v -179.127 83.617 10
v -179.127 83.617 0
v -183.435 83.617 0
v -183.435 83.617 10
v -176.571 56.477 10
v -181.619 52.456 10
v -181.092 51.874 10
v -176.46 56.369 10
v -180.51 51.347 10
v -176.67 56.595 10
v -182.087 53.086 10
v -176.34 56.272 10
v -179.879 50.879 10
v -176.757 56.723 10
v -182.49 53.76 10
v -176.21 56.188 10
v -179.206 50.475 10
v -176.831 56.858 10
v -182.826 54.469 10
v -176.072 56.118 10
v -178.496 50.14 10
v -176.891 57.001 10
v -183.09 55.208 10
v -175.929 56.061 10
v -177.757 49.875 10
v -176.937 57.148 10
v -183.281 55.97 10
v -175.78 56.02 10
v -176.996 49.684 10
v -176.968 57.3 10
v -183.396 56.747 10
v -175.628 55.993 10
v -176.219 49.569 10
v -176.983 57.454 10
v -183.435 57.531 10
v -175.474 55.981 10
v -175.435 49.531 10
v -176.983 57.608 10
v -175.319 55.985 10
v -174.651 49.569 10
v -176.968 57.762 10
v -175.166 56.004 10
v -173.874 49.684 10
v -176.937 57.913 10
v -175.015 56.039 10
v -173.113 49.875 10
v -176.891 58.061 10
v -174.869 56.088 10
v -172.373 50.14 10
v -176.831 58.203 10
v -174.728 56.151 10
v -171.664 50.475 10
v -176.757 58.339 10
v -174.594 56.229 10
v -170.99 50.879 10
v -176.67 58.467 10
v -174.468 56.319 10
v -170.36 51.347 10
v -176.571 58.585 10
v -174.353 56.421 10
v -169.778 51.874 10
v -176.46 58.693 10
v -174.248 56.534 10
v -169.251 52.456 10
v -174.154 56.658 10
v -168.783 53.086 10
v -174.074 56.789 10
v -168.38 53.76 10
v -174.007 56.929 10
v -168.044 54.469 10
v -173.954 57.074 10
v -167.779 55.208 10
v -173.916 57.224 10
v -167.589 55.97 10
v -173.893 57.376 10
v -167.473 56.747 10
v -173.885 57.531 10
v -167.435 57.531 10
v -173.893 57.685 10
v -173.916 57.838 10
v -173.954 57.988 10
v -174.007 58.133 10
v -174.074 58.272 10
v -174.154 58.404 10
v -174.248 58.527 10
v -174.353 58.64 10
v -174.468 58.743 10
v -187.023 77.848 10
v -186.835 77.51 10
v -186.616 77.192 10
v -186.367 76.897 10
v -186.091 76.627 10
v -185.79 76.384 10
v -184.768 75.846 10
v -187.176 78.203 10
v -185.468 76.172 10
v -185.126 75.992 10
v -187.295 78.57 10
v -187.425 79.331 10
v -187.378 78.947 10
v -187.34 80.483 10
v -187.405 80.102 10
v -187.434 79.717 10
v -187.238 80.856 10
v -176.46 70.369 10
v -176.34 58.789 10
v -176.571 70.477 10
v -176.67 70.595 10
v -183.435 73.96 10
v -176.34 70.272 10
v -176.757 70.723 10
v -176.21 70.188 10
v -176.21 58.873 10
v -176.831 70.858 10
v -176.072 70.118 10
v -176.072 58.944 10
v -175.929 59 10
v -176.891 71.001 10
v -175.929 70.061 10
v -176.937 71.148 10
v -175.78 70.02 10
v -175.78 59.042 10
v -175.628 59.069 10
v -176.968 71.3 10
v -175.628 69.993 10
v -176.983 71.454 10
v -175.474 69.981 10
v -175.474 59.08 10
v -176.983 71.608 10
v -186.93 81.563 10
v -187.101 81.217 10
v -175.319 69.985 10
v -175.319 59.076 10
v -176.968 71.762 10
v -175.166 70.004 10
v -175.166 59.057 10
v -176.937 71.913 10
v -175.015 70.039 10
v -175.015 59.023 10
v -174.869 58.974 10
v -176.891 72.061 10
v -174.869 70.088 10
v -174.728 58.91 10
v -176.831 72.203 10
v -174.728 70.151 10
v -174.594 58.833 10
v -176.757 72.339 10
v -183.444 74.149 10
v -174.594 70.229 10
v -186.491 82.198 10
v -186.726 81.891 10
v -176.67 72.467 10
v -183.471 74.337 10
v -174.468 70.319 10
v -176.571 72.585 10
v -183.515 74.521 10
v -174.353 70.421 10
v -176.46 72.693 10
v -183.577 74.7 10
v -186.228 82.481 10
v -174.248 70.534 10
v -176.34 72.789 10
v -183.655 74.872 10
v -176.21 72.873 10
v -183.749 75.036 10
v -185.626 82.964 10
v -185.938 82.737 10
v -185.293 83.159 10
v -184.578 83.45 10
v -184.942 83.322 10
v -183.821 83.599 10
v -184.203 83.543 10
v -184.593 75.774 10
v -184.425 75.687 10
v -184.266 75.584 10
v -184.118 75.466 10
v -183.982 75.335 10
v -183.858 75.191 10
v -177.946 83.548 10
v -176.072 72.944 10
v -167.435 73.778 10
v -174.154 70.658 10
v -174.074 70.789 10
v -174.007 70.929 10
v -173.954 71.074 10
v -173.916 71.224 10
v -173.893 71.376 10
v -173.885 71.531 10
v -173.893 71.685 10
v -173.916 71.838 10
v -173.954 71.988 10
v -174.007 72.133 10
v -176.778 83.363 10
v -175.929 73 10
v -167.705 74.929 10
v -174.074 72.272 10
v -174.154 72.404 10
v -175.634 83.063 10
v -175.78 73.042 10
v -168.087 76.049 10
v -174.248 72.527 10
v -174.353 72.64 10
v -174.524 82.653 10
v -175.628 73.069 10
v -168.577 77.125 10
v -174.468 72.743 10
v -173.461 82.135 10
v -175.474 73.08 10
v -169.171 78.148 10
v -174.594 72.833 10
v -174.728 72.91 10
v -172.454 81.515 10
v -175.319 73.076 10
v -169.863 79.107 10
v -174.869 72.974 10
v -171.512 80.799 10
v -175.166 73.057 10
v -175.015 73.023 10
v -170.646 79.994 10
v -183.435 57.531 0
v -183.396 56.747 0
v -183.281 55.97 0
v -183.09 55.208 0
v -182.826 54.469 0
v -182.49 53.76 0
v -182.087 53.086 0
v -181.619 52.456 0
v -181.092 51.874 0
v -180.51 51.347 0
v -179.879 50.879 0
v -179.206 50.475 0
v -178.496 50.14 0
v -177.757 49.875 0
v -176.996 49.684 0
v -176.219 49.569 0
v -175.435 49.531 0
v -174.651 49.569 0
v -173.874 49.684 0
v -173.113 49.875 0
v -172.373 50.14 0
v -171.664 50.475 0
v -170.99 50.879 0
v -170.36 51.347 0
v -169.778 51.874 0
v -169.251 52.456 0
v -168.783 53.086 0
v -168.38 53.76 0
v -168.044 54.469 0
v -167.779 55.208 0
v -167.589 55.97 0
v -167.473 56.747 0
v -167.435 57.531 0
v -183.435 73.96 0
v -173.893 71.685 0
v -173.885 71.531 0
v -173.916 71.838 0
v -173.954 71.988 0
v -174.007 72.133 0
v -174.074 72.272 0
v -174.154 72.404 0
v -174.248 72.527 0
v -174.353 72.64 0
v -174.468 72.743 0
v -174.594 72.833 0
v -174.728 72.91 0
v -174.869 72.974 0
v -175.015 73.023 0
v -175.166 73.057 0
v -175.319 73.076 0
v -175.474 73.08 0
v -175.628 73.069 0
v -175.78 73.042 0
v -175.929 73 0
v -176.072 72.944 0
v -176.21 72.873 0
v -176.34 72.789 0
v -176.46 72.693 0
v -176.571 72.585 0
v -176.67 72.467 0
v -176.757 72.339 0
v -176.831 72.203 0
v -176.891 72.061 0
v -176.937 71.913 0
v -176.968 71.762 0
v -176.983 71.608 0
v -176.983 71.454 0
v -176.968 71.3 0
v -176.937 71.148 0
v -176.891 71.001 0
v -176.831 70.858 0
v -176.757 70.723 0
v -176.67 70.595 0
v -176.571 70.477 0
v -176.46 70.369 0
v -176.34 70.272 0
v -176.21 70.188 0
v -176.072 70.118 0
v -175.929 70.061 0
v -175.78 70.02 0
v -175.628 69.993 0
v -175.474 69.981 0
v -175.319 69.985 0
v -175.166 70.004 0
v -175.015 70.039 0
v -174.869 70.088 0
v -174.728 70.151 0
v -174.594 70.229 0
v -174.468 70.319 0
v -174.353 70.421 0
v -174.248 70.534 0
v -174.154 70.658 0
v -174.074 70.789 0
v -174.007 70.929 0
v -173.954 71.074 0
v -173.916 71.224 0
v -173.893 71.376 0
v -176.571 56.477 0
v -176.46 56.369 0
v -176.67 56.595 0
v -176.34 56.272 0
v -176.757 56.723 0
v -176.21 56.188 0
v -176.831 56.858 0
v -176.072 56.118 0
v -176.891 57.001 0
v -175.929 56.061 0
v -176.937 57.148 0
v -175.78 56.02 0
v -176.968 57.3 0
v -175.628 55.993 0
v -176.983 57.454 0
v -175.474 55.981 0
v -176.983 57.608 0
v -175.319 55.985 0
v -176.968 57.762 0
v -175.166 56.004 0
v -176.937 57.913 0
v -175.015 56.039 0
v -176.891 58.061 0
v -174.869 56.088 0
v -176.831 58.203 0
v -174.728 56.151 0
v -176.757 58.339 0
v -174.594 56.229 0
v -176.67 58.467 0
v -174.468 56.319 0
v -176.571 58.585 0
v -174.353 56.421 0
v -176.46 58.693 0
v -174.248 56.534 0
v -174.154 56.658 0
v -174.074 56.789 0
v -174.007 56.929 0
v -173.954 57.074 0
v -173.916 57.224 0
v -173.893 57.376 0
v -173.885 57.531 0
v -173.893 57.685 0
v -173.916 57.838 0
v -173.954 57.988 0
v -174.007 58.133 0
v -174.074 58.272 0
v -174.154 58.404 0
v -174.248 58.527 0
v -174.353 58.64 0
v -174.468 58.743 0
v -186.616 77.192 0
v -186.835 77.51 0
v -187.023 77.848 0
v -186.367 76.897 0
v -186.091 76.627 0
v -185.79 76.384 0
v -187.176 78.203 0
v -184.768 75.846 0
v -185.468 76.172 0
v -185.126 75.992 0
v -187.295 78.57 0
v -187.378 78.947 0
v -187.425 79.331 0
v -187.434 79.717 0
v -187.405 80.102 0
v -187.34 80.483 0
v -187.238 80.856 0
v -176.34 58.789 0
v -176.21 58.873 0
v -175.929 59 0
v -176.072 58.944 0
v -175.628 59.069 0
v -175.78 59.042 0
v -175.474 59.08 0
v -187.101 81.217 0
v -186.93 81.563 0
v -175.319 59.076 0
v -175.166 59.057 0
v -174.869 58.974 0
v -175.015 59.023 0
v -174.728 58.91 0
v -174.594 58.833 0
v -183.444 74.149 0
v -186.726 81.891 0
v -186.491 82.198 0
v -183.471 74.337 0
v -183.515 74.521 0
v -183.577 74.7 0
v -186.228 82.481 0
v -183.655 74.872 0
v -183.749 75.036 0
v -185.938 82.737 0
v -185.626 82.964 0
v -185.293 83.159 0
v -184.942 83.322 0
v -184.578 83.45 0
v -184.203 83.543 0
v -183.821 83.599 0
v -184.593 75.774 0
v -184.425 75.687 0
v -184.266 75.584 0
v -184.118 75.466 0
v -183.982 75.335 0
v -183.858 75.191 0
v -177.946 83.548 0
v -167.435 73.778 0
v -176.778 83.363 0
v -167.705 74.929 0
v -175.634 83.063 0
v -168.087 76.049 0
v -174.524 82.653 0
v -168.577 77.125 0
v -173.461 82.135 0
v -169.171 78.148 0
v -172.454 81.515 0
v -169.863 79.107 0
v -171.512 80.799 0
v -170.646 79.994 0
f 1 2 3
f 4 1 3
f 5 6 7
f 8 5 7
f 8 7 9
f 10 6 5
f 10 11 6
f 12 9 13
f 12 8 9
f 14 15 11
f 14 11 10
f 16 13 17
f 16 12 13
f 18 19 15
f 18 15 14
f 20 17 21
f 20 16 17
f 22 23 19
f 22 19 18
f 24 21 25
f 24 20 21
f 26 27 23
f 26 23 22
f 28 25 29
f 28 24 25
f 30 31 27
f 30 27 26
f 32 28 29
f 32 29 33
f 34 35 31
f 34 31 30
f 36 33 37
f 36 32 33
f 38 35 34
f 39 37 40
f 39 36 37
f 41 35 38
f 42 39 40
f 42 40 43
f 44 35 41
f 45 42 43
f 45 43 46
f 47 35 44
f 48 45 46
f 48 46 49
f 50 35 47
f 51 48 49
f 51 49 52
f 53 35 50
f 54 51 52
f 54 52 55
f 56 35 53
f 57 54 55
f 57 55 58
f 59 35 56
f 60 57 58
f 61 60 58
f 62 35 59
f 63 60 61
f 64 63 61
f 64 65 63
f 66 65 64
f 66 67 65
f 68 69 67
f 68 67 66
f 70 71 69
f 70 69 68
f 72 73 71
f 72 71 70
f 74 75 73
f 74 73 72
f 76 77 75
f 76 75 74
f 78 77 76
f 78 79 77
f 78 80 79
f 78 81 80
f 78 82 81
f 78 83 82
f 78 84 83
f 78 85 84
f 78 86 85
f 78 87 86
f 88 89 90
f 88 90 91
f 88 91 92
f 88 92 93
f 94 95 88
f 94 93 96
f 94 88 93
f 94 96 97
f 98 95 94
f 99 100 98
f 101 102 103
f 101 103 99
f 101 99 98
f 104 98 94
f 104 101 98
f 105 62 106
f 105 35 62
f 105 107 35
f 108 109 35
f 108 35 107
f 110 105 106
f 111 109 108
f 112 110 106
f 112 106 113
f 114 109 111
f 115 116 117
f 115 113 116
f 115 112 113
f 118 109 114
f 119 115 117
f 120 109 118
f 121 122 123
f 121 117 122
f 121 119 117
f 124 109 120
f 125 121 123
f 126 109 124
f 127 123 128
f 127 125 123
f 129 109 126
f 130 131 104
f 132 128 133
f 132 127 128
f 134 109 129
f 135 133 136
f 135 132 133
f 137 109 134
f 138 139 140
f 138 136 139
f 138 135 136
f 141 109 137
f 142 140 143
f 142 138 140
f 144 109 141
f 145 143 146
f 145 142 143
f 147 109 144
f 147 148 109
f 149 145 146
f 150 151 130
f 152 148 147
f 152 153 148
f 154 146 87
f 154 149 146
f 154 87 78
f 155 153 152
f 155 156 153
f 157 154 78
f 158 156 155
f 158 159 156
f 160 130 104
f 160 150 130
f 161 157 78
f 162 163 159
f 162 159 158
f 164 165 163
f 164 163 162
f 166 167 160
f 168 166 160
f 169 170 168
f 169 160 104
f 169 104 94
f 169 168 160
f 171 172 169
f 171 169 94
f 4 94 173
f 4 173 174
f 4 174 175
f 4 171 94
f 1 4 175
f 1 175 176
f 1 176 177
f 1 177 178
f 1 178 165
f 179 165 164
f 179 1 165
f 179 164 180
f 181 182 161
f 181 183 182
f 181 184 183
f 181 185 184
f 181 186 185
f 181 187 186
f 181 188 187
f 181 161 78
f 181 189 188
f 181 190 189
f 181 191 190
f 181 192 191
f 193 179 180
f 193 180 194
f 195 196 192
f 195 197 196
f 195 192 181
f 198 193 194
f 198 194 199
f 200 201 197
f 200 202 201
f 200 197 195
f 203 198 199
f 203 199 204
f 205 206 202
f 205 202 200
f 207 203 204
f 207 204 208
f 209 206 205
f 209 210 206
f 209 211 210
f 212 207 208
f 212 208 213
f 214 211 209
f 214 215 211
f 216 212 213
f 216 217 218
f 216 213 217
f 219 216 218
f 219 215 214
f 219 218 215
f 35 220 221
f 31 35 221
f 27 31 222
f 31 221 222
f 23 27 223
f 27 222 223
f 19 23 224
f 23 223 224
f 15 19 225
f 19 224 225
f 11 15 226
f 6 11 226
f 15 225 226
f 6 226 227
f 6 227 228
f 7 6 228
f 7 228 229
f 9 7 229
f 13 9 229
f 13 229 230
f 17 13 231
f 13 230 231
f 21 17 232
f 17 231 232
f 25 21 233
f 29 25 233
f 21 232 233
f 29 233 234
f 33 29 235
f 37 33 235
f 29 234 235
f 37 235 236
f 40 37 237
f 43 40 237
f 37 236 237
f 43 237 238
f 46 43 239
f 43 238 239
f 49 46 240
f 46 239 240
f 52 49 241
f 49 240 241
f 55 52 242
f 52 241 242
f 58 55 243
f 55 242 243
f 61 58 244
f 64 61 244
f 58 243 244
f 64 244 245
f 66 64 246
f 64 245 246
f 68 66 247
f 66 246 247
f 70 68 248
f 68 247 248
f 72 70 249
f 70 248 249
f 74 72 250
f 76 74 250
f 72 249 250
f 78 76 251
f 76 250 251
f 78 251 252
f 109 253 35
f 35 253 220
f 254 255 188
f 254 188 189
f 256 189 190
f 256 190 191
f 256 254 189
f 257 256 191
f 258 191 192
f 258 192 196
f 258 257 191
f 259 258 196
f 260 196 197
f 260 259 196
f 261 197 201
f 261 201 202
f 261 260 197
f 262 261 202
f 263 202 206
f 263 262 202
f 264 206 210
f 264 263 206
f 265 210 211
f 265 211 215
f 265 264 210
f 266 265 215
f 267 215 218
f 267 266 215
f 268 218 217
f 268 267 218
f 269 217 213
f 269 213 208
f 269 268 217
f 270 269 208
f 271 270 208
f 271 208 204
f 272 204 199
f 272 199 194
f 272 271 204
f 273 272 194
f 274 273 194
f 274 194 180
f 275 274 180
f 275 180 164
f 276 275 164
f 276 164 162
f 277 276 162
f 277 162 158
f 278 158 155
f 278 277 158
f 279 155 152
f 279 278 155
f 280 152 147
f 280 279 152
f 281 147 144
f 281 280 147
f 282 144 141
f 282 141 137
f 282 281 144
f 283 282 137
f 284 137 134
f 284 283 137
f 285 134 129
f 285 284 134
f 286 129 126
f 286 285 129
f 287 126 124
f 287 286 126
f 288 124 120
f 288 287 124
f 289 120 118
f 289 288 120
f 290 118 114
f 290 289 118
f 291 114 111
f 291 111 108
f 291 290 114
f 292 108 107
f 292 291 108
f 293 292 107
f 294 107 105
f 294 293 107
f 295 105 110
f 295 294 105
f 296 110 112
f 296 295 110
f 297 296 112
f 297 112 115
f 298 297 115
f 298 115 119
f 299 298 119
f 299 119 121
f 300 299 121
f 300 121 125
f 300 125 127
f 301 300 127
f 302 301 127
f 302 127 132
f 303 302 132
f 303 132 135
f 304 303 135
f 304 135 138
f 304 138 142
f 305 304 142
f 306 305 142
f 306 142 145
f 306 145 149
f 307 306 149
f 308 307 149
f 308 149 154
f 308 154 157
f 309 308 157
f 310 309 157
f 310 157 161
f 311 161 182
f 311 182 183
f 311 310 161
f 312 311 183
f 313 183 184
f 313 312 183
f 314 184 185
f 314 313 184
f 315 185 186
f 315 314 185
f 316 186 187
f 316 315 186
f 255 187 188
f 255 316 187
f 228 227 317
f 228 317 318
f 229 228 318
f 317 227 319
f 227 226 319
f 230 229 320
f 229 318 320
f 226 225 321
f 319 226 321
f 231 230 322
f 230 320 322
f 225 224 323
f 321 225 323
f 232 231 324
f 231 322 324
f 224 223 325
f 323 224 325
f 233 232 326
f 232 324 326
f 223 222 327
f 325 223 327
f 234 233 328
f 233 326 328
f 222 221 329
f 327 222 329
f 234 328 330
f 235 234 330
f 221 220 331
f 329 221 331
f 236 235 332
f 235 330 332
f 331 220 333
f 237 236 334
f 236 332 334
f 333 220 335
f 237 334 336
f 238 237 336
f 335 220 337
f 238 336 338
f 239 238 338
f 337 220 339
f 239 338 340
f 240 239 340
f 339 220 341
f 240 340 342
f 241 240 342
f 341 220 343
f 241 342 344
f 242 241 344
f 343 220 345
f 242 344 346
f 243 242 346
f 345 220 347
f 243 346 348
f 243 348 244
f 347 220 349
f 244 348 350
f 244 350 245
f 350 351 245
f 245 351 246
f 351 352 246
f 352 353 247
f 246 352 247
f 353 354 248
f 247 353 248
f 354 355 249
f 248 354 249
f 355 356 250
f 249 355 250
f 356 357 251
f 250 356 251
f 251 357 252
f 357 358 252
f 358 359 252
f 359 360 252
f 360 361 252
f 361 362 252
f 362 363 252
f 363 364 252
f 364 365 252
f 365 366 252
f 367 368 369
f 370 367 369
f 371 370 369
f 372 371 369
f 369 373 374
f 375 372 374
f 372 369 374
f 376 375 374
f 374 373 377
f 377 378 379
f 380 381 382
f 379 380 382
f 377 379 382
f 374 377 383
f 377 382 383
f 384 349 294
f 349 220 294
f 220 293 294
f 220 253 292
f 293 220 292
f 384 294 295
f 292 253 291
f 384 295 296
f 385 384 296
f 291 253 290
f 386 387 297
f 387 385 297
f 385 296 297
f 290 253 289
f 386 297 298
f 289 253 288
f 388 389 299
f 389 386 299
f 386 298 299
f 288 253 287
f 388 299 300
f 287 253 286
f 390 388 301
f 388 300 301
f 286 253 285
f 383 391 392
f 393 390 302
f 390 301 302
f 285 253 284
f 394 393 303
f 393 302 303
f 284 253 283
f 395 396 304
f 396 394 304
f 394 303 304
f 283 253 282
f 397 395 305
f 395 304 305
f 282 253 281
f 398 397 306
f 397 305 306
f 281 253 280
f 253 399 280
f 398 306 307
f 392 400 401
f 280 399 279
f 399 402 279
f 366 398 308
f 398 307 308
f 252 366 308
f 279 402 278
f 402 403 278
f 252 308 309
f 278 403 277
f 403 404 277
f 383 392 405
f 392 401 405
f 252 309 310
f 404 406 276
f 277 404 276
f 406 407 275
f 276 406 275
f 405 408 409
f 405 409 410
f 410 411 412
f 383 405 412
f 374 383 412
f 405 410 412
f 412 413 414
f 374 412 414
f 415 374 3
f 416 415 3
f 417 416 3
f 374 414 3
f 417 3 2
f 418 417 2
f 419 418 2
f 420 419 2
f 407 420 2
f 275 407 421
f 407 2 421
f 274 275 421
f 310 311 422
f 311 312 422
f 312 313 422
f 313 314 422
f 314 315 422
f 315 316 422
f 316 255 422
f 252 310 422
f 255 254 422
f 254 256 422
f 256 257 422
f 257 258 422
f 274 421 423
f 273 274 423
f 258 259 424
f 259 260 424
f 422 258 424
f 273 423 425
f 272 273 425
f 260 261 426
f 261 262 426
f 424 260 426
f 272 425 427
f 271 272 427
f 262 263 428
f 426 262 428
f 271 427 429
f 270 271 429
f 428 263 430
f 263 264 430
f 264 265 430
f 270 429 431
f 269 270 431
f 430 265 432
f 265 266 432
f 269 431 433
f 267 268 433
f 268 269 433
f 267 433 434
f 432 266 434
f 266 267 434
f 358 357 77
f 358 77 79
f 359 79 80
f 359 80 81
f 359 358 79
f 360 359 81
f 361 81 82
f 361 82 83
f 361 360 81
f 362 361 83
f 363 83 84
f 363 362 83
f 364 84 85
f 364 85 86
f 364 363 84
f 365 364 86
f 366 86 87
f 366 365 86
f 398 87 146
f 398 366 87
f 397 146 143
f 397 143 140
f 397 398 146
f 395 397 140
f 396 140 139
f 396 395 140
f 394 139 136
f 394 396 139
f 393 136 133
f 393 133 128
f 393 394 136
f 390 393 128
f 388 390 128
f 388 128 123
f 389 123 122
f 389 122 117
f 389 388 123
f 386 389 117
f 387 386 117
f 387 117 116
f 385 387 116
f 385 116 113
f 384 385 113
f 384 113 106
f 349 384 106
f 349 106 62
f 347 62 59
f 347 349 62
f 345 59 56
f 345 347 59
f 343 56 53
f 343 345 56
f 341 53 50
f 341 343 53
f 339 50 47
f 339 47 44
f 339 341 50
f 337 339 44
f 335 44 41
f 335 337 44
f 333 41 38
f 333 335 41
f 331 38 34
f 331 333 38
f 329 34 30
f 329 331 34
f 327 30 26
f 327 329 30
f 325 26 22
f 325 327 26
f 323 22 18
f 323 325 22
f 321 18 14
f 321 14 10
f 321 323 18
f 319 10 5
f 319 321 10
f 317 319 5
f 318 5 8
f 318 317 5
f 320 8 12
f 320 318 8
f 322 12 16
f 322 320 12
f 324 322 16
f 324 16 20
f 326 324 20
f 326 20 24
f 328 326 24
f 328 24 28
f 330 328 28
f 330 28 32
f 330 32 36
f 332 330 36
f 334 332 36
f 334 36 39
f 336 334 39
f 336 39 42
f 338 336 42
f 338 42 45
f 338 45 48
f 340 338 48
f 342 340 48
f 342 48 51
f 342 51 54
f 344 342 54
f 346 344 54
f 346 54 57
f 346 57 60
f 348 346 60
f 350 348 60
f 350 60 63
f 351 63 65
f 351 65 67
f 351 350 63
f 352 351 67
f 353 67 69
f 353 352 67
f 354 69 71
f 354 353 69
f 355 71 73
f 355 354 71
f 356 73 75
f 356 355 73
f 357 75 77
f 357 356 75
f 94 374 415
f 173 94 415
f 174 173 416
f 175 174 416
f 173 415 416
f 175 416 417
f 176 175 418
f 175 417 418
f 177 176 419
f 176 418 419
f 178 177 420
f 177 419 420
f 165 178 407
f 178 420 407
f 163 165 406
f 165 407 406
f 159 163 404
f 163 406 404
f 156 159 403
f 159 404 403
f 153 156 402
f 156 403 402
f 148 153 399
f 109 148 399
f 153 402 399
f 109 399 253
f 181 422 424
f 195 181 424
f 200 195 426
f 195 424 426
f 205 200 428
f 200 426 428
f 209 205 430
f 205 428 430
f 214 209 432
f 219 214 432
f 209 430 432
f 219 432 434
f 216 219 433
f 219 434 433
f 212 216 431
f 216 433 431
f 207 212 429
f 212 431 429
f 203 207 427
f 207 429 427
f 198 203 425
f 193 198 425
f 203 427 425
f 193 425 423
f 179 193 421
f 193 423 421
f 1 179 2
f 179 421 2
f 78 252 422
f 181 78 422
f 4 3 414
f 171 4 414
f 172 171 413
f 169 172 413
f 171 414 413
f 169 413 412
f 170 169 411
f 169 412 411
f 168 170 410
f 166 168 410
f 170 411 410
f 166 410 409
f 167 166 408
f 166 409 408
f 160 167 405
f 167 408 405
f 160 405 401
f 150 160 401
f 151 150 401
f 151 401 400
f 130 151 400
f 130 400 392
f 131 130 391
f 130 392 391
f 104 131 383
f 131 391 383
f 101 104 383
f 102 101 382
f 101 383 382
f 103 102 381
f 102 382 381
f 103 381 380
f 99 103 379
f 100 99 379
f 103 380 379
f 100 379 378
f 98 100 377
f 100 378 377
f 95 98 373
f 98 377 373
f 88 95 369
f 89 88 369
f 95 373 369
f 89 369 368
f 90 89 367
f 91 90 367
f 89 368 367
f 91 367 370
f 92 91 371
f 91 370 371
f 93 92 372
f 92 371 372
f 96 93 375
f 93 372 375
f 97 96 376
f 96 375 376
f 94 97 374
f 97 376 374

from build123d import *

# Parameters (mm, degrees)
SZKIC1_R                    = 1.55
DODANIE_WYCI_GNI_CIE1_DEPTH = 10


with BuildPart() as part:
    # Szkic1 → Dodanie-wyciągnięcie1 (new body)
    with BuildSketch(Plane.XY):
        with BuildLine():
            Line((-179.126801066, 83.617157096), (-183.434880274, 83.617157096))
            ThreePointArc((-183.434880274, 83.617157096), (-187.377274513, 80.293565011), (-184.768213607, 75.84592093))
            ThreePointArc((-184.768213607, 75.84592093), (-183.801887112, 75.115003385), (-183.434880274, 73.960302847))
            Line((-183.434880274, 73.960302847), (-183.434880274, 57.530770571))
            ThreePointArc((-183.434880274, 57.530770571), (-175.434880274, 49.530770571), (-167.434880274, 57.530770571))
            Line((-167.434880274, 57.530770571), (-167.434880274, 73.777889147))
            ThreePointArc((-167.434880274, 73.777889147), (-171.51222692, 80.799152225), (-179.126801066, 83.617157096))
        make_face()
        with Locations((-175.434880274, 57.530770571)):
            Circle(SZKIC1_R, mode=Mode.SUBTRACT)
        with Locations((-175.434880274, 71.530770571)):
            Circle(SZKIC1_R, mode=Mode.SUBTRACT)
    extrude(amount=DODANIE_WYCI_GNI_CIE1_DEPTH)


solid = part.part
